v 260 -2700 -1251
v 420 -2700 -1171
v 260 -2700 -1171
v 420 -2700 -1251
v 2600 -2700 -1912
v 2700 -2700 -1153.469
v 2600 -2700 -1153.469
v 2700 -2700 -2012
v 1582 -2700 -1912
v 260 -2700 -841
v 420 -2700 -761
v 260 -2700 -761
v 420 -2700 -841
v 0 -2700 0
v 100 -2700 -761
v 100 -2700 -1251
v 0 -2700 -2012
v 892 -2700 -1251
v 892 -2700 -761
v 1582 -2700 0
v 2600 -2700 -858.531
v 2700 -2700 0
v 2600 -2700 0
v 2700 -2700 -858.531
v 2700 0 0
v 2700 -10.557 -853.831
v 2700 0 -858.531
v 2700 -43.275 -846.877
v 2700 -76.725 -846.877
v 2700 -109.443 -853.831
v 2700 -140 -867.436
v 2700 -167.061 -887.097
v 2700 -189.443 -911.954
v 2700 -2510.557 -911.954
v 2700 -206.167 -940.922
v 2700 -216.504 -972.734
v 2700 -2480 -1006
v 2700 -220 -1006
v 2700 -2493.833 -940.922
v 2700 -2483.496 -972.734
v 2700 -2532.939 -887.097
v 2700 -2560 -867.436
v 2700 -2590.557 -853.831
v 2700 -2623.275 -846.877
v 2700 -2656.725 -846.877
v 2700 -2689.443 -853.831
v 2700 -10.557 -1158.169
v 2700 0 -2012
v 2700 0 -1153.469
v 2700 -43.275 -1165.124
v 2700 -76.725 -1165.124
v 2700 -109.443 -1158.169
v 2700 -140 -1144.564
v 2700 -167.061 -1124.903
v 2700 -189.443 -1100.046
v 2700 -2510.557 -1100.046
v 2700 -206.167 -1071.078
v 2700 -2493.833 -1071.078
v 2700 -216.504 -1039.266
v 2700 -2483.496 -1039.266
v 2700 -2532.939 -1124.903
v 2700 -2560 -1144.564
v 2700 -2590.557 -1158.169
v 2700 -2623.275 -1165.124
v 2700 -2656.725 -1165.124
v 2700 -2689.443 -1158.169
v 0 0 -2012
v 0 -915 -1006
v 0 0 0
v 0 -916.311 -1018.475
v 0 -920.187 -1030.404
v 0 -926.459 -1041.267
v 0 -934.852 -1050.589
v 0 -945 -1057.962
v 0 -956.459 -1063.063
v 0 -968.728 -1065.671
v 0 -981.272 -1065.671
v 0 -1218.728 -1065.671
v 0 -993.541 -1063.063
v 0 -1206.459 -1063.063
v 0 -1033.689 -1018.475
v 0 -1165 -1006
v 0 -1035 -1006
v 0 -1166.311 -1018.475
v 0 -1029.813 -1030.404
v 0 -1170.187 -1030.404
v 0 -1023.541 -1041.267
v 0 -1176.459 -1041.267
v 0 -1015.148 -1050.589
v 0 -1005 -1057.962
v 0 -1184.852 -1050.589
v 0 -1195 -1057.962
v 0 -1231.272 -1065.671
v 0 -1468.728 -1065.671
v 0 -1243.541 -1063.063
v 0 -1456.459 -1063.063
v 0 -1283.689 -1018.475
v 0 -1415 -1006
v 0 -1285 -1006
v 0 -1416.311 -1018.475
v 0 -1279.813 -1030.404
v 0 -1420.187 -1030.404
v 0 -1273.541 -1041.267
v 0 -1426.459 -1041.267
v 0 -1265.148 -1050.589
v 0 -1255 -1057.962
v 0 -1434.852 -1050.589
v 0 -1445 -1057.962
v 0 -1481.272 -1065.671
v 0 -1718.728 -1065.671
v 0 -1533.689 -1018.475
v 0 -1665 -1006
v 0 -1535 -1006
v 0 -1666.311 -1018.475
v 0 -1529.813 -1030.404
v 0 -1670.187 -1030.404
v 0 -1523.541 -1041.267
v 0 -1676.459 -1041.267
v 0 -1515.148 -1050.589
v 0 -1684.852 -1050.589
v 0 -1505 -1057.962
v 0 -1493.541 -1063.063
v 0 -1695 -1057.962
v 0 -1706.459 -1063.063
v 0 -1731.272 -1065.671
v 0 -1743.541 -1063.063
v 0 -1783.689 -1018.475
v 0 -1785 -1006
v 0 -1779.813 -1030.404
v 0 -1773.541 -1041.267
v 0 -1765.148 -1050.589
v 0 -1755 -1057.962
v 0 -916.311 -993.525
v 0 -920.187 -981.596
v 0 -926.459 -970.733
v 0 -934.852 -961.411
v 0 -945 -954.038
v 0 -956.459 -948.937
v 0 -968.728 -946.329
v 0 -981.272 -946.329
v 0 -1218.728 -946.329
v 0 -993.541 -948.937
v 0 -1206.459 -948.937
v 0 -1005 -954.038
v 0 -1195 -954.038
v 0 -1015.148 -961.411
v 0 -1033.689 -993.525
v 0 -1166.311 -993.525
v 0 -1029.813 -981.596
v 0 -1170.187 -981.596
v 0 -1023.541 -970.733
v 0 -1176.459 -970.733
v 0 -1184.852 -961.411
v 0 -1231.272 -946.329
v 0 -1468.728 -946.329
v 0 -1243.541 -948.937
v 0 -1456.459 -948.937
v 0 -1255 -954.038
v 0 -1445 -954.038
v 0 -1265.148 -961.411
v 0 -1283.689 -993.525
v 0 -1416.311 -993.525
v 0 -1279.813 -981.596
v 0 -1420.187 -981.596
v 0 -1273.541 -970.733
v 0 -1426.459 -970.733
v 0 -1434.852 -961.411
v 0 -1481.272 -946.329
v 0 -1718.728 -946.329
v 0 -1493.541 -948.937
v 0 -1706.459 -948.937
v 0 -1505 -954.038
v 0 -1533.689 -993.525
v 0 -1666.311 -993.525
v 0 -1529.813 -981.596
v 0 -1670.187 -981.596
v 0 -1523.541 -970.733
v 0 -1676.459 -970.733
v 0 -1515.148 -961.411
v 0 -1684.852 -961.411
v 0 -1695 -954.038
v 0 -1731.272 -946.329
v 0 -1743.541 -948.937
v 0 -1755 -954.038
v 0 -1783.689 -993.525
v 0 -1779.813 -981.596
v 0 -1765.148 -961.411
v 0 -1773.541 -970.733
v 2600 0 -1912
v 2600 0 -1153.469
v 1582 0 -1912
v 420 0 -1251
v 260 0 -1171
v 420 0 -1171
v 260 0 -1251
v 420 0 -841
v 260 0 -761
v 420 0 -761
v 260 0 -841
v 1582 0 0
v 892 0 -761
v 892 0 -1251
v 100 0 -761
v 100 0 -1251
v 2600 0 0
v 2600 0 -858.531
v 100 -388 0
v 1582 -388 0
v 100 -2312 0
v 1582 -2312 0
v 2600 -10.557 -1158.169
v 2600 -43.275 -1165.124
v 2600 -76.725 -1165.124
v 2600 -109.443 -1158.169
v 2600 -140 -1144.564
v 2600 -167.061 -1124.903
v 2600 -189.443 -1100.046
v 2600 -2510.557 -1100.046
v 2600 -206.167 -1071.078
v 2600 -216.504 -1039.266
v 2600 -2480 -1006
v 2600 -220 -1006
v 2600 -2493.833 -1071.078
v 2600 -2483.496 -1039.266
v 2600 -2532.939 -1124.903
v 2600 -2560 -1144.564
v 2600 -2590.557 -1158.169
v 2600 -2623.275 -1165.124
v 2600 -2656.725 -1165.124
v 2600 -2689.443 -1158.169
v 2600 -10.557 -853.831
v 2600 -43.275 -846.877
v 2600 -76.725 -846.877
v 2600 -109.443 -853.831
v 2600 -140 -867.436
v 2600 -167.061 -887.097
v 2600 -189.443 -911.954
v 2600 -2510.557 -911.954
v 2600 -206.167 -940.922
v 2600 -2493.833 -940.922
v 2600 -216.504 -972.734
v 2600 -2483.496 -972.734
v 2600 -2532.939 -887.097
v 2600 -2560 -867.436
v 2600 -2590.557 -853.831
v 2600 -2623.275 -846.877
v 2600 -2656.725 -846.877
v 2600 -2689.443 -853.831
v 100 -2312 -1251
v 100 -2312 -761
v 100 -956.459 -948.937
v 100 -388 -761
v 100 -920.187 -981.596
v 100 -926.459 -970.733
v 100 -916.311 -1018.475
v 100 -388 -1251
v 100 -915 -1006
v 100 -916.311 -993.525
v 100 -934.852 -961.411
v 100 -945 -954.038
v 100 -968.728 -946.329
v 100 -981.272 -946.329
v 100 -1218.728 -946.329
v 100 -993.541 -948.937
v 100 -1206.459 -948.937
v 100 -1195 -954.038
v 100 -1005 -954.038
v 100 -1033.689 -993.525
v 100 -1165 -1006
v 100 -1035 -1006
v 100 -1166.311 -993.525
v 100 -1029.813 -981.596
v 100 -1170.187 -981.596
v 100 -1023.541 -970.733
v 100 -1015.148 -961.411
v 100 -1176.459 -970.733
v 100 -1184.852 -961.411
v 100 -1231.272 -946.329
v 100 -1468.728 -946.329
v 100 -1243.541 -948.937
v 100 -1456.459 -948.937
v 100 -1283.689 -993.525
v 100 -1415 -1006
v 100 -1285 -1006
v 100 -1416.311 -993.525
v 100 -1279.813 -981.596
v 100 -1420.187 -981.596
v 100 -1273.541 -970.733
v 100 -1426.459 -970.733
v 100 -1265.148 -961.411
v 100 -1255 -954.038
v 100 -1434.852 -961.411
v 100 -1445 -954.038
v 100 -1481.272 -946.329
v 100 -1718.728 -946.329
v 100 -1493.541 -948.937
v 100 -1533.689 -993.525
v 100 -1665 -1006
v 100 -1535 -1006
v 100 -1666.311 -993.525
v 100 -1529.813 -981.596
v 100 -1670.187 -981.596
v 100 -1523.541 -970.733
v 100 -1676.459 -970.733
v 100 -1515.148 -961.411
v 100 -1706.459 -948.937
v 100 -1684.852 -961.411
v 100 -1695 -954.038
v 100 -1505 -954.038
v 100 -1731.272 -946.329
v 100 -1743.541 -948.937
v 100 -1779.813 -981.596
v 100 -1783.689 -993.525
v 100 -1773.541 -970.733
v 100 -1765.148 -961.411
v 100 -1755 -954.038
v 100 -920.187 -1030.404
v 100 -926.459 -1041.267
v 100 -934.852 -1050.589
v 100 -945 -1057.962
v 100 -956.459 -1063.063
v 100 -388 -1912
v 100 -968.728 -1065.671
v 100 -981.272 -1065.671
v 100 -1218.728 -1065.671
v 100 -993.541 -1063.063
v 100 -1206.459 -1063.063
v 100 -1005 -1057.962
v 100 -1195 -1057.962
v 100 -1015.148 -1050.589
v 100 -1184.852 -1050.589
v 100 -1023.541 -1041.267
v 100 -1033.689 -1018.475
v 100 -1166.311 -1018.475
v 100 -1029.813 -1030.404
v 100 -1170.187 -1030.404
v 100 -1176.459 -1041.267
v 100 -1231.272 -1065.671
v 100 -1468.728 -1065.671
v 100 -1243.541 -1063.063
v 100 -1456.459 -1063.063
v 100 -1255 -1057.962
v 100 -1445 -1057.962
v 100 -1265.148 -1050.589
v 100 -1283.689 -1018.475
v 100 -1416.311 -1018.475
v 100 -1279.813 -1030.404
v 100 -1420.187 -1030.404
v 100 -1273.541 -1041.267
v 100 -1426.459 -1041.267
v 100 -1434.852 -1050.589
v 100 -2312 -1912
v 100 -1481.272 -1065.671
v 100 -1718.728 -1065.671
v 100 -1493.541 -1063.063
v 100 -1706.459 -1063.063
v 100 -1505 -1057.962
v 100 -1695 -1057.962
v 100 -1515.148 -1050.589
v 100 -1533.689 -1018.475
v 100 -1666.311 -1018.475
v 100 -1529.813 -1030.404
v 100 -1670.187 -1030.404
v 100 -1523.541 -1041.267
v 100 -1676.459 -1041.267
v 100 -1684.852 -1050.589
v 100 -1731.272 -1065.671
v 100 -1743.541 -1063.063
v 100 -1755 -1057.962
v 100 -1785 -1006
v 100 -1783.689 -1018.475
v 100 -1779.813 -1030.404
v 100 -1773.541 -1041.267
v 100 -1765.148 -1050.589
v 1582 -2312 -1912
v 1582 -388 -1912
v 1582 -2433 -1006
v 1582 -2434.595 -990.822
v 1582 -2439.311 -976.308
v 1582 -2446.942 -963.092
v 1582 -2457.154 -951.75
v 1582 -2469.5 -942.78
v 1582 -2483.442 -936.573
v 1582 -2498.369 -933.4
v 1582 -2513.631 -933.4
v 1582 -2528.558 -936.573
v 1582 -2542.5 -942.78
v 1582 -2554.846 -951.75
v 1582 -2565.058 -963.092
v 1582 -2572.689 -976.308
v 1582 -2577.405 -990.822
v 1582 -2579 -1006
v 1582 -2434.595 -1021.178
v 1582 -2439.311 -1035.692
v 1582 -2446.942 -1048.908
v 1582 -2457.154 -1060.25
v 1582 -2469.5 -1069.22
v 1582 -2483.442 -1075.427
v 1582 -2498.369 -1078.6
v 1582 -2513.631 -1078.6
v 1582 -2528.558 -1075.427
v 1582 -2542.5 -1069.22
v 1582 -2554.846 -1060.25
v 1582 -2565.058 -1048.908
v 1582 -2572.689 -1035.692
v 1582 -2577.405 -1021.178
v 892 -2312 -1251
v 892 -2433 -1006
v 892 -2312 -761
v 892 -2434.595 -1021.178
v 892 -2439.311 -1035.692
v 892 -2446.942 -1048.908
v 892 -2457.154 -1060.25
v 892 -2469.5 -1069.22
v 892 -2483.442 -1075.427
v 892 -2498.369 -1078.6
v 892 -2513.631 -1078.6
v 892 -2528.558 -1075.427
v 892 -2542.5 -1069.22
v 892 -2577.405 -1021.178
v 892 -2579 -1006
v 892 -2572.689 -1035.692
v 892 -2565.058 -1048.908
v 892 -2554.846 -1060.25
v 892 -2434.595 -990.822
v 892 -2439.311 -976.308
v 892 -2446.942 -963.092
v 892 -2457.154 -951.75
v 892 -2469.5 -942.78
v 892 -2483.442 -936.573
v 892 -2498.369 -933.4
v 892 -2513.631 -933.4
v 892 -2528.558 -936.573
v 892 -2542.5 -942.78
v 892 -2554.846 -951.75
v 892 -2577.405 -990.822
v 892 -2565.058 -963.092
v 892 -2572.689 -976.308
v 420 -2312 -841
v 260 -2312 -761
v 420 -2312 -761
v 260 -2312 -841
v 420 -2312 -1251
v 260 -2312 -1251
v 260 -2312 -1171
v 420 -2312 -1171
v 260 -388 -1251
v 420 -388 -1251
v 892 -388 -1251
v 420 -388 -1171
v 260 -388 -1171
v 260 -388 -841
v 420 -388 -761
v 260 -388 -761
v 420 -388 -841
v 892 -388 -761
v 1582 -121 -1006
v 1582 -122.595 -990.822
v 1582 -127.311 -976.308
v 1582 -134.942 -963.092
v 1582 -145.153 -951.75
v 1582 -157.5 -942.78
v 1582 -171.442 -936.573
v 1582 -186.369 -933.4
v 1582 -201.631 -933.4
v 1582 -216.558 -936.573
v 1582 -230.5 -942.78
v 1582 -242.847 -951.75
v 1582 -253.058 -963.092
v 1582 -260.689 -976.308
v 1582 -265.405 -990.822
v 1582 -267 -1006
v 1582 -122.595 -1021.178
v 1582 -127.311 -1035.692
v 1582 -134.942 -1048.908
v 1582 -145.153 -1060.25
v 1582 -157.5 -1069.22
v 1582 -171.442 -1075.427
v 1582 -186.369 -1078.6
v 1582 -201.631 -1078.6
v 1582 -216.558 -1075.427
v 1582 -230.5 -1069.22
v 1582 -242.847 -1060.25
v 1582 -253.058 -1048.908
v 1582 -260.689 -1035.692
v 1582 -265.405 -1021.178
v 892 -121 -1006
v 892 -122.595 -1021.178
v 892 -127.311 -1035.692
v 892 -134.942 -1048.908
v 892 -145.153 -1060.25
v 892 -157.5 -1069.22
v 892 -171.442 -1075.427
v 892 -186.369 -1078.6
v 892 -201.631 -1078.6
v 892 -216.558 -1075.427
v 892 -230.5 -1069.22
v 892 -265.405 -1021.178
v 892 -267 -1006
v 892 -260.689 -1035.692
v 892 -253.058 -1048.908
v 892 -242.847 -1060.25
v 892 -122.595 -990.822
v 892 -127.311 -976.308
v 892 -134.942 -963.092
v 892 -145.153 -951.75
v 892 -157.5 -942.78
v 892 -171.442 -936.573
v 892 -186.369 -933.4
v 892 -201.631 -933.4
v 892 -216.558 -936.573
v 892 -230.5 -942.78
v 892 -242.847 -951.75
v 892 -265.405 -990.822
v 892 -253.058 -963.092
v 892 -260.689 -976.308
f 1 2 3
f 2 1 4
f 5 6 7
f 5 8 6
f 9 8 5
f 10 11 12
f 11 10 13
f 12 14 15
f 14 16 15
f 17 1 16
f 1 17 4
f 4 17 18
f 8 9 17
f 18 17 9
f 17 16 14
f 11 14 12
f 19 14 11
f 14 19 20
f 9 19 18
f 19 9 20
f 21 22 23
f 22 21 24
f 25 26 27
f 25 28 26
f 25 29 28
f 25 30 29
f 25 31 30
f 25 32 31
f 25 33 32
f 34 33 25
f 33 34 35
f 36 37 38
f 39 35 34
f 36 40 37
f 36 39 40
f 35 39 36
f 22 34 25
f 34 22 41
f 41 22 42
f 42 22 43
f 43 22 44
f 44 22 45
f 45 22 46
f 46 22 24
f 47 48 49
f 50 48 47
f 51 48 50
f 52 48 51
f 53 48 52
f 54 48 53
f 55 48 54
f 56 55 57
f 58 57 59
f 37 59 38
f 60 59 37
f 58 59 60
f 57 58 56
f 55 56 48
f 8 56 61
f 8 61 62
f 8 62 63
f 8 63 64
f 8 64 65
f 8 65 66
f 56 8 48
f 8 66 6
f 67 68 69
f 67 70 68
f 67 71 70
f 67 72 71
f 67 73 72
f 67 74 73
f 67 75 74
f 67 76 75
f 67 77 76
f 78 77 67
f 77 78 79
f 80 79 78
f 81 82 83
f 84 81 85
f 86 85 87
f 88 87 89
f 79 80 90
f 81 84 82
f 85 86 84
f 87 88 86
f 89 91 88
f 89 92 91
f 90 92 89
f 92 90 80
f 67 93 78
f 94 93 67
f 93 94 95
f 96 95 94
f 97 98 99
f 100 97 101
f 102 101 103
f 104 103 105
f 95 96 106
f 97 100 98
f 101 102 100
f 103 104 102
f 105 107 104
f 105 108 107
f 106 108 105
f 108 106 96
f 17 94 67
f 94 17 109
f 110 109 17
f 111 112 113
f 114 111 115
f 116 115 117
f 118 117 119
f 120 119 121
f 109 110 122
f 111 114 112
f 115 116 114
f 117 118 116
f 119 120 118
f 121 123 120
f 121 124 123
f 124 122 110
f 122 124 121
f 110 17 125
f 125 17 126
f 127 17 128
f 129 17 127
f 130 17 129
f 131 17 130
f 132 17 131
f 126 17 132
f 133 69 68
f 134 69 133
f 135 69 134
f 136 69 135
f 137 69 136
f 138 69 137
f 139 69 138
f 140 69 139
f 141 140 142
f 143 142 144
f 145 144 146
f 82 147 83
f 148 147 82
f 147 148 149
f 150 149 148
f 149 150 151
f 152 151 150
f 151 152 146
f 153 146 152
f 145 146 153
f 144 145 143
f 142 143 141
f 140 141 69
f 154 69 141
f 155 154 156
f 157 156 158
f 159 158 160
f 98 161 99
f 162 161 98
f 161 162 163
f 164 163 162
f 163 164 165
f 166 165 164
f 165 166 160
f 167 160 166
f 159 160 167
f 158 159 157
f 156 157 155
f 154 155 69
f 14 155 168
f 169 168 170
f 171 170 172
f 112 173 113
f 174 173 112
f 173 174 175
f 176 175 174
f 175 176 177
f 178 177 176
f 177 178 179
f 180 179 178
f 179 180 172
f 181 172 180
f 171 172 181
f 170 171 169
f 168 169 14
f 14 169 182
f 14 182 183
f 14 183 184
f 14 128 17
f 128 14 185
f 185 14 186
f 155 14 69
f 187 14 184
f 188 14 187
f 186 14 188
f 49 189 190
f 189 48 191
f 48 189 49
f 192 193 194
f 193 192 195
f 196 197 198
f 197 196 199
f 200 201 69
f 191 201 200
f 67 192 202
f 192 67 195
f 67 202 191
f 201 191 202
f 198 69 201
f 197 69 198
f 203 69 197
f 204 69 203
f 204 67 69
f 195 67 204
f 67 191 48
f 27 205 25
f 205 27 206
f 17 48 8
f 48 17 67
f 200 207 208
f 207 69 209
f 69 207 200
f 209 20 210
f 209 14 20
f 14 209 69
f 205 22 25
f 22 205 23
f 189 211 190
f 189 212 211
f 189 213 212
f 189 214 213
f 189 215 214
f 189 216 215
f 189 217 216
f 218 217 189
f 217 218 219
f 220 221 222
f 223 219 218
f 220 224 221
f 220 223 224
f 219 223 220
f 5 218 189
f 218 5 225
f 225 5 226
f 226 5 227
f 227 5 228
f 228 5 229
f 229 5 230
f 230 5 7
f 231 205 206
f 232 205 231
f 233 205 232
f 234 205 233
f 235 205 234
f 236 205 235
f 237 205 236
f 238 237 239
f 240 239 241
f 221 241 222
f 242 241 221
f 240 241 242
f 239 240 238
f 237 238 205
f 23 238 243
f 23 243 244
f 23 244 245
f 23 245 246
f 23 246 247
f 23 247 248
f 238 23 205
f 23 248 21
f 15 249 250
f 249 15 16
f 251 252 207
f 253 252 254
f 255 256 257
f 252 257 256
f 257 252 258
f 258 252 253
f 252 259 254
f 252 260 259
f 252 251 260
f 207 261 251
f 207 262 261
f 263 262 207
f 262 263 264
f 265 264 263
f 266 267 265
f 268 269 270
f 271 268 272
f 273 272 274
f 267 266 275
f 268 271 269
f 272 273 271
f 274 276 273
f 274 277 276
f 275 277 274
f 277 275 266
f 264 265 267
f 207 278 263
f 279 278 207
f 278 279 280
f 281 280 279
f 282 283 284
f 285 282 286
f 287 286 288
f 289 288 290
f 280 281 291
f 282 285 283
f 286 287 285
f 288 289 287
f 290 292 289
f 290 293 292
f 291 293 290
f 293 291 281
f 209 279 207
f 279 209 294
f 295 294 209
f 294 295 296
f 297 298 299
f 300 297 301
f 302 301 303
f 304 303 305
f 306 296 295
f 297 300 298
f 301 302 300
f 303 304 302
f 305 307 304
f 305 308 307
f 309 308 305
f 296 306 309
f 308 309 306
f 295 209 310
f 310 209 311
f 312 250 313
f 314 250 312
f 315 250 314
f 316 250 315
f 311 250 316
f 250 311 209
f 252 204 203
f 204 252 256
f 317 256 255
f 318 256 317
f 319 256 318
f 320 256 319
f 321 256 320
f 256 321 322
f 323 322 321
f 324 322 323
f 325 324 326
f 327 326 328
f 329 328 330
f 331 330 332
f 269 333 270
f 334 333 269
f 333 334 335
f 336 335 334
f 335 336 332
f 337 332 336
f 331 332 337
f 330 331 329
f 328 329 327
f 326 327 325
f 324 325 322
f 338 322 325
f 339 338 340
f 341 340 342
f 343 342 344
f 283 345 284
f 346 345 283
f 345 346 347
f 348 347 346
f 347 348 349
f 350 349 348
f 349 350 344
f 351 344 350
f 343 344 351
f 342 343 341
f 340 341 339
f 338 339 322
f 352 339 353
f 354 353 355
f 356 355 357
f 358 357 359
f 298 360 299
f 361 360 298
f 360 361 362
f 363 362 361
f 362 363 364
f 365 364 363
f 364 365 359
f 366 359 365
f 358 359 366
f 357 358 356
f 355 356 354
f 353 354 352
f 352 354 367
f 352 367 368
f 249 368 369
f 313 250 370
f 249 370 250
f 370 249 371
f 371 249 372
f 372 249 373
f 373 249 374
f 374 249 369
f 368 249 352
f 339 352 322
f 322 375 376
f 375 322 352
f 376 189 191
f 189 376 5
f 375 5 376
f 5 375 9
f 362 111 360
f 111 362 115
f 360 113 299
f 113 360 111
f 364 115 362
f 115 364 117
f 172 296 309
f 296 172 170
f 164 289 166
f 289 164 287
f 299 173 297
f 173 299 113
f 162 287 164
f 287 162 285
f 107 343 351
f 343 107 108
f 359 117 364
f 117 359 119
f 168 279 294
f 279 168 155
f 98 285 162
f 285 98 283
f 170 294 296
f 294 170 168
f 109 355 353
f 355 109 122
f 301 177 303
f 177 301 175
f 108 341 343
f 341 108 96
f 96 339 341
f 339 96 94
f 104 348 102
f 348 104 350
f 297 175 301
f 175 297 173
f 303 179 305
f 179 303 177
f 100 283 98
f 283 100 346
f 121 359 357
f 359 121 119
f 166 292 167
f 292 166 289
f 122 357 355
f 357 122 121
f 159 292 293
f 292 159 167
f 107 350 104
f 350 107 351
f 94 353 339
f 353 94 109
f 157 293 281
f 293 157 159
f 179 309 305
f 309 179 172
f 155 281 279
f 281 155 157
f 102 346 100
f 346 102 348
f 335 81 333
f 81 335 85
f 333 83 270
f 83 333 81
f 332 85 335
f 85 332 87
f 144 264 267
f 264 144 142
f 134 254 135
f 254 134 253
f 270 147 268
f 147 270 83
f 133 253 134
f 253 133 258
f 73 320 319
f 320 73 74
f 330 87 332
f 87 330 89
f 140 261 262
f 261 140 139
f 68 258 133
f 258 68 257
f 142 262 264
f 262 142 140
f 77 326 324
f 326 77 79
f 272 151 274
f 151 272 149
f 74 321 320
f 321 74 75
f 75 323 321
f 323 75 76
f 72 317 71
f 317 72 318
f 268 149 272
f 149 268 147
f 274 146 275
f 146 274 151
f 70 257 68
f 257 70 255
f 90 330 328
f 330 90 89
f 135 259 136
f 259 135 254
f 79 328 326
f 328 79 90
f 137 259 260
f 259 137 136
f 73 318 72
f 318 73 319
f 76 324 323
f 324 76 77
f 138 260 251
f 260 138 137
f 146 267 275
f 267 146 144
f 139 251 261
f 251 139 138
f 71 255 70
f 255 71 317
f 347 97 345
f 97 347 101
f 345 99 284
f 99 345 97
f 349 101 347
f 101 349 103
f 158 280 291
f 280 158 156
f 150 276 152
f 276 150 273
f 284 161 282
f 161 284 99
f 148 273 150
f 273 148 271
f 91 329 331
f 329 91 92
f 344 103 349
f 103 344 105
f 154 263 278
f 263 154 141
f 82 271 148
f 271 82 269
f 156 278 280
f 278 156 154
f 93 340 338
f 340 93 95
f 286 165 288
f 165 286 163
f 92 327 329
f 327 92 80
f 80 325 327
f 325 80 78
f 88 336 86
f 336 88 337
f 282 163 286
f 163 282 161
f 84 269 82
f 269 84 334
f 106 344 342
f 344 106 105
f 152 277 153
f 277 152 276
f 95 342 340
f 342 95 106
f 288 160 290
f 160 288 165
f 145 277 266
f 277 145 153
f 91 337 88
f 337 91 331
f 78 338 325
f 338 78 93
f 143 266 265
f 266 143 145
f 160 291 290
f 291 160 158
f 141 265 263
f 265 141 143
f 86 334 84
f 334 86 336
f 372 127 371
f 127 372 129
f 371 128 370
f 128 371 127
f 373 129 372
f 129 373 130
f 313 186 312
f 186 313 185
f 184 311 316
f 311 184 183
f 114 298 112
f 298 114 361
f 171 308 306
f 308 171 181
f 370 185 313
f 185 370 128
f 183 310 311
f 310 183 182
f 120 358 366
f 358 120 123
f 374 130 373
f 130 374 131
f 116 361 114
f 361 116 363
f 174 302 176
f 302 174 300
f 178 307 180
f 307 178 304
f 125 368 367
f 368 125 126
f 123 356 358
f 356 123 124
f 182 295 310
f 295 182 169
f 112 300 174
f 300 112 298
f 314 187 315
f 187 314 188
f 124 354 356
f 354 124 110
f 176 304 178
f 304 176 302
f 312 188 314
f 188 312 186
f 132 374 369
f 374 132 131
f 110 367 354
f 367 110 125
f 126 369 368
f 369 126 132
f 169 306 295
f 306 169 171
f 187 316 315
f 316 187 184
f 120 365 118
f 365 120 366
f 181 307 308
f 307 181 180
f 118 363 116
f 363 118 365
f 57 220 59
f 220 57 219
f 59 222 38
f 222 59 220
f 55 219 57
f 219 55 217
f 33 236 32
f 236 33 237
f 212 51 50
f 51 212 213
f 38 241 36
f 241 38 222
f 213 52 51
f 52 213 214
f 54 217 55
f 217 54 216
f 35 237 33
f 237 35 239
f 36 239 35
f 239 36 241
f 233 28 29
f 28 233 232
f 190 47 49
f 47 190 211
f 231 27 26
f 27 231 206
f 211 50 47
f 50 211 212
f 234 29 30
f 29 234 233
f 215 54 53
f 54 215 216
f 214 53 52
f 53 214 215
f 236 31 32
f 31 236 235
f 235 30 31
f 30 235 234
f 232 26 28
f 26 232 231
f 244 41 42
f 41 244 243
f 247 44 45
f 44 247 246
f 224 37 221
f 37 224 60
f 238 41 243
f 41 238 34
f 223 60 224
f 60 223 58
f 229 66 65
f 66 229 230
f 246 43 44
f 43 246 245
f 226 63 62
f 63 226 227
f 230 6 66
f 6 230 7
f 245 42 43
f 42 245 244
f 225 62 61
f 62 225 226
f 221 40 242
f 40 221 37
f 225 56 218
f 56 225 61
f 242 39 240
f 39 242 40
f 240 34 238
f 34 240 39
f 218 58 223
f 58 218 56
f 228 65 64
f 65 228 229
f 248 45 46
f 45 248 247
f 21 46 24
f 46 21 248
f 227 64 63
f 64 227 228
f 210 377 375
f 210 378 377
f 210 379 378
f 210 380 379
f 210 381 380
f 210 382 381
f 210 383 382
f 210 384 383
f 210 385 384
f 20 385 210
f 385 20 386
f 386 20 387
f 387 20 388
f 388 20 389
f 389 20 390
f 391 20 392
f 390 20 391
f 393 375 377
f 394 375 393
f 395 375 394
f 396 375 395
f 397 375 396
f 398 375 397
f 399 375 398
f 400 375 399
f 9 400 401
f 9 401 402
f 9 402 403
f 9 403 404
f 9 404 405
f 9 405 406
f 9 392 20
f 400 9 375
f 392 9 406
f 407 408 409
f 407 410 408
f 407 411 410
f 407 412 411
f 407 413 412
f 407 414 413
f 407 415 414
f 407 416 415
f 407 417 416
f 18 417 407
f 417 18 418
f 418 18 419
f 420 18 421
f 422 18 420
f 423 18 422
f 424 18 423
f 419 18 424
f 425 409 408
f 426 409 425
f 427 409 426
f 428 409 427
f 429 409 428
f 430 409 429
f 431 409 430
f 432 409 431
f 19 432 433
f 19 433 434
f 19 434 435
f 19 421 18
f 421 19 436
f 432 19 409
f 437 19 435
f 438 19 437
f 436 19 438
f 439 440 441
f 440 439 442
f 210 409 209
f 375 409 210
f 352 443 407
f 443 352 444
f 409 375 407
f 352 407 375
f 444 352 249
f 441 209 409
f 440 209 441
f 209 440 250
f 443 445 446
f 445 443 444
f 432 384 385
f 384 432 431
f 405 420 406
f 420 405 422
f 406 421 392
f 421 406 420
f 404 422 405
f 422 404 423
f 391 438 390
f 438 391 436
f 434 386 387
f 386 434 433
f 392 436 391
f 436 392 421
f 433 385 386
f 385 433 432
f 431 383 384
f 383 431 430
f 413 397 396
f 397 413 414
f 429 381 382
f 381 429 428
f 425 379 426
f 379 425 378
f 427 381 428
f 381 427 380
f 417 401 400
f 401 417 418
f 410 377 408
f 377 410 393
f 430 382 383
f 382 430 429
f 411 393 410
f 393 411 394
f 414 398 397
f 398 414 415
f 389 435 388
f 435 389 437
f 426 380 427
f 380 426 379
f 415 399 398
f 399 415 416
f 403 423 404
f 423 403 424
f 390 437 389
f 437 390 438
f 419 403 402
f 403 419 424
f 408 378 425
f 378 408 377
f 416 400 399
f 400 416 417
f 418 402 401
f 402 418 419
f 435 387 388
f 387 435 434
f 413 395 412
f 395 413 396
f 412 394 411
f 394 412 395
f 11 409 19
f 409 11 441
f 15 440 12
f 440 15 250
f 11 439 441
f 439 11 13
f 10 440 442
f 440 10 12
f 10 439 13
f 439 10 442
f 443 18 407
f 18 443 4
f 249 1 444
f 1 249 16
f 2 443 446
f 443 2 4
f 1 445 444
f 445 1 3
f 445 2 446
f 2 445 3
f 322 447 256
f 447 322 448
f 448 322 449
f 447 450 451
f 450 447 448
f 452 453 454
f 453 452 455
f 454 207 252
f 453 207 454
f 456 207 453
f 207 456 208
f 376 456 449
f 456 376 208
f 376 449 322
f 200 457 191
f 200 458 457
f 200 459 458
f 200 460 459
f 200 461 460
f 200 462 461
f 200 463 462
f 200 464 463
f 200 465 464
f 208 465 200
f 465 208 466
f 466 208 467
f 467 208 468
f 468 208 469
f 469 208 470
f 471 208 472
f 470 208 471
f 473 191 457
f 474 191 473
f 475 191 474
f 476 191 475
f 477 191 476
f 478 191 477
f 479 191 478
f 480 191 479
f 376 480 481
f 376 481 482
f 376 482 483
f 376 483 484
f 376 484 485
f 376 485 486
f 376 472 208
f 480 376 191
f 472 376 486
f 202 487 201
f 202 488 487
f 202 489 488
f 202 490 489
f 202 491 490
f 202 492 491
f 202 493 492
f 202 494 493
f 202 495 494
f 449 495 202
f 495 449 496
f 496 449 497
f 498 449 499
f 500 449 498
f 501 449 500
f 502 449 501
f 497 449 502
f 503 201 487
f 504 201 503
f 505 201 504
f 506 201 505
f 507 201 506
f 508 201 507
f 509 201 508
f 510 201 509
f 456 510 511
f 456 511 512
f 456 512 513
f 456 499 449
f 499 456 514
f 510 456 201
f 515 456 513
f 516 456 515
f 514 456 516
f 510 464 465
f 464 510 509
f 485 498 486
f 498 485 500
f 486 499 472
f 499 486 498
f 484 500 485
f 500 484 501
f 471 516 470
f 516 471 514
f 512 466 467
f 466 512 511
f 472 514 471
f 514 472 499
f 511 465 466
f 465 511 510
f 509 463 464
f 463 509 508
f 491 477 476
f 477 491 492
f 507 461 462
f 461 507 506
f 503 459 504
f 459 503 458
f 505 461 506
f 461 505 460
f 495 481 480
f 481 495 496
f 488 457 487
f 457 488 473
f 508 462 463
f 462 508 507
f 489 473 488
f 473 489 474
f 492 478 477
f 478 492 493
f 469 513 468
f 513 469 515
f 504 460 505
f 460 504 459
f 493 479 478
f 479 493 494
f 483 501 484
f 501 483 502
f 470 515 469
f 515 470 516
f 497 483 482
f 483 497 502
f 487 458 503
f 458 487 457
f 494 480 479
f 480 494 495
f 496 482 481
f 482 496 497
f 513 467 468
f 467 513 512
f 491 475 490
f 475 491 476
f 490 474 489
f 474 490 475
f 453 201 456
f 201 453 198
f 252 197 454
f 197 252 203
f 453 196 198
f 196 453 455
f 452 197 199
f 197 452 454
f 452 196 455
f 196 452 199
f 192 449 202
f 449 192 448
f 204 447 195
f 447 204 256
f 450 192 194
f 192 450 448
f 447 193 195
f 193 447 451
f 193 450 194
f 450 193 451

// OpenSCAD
module servo_stand(crack=410, width=761) {
  length = 388;   //length of 1 servo clip
  bar_height = 690; //height of the support bar
  height = 792;  //height of whole servo stand
  radius = 73;    //radius of hole
  tiny_bit_mount = 160;
  tiny_bit_size_w = 80;
  tiny_bit_size_h = 160;

  cube([length, width, height]); //left leg
  translate([0, width, tiny_bit_mount]) cube([length, tiny_bit_size_w, tiny_bit_size_h]);
  translate([0, width + crack, 0]) cube([length, width, height]); //right leg
  translate([0, width + crack - tiny_bit_size_w, tiny_bit_mount]) cube([length, tiny_bit_size_w, tiny_bit_size_h]);

  difference() { //bar
    translate([0, 0, height]) cube([length, 2*width + crack, bar_height]);
    translate([length/2, (2*width + crack)/2, height]) cylinder(h=bar_height, r=radius);
  }
}

module hip()
{
  crack = 490;
  width = 761;
  side1 = 2700;     //29mm side of whole thing servo size: 26.58mm
  side2 = width*2 + crack;
  side3 = 2700;
  thck = 100;      //1mm plastic thickness
  hole_dist=250; // distance between holes on bottom layer
  hole_r=60;     //radius of metal-wire hole
  screw_driver_r=160;
  
 
  difference() {	
    cube([side1,side2,side3]); //global cube
    translate([0,thck,thck]) cube([side1, side2-(thck*2), side3-(thck*2)]); // remove all inside
    translate([0,0,thck]) cube([side1, thck, side1-(thck*2)]); //remove one wall
    translate([side1/2 + 0.5*hole_dist, side2/2, 0]) cylinder(h=100, r=hole_r); //center hole
    translate([side1/2 - 1.5*hole_dist, side2/2, 0]) cylinder(h=100, r=hole_r); //left hole
    translate([side1/2 - 0.5*hole_dist, side2/2, 0]) cylinder(h=100, r=hole_r); //left hole
    translate([side1/2 + 1.5*hole_dist, side2/2, 0]) cylinder(h=100, r=hole_r); //right hole
    translate([0 + 60, side2/2, side3-thck]) cylinder(h=thck, r=screw_driver_r); //screw_driver hole
    translate([side1 - 60, side2/2, side3-thck]) cylinder(h=thck, r=screw_driver_r); //screw_driver hole
  }
  translate([ side1-388, 0, 100]) servo_stand(crack, width);
  translate([ 0, 0, 100]) servo_stand(crack, width);
}

//hip();
//servo_stand();
rotate([90, 180, 90]) hip(); //rotating to position it well on 3D printer
